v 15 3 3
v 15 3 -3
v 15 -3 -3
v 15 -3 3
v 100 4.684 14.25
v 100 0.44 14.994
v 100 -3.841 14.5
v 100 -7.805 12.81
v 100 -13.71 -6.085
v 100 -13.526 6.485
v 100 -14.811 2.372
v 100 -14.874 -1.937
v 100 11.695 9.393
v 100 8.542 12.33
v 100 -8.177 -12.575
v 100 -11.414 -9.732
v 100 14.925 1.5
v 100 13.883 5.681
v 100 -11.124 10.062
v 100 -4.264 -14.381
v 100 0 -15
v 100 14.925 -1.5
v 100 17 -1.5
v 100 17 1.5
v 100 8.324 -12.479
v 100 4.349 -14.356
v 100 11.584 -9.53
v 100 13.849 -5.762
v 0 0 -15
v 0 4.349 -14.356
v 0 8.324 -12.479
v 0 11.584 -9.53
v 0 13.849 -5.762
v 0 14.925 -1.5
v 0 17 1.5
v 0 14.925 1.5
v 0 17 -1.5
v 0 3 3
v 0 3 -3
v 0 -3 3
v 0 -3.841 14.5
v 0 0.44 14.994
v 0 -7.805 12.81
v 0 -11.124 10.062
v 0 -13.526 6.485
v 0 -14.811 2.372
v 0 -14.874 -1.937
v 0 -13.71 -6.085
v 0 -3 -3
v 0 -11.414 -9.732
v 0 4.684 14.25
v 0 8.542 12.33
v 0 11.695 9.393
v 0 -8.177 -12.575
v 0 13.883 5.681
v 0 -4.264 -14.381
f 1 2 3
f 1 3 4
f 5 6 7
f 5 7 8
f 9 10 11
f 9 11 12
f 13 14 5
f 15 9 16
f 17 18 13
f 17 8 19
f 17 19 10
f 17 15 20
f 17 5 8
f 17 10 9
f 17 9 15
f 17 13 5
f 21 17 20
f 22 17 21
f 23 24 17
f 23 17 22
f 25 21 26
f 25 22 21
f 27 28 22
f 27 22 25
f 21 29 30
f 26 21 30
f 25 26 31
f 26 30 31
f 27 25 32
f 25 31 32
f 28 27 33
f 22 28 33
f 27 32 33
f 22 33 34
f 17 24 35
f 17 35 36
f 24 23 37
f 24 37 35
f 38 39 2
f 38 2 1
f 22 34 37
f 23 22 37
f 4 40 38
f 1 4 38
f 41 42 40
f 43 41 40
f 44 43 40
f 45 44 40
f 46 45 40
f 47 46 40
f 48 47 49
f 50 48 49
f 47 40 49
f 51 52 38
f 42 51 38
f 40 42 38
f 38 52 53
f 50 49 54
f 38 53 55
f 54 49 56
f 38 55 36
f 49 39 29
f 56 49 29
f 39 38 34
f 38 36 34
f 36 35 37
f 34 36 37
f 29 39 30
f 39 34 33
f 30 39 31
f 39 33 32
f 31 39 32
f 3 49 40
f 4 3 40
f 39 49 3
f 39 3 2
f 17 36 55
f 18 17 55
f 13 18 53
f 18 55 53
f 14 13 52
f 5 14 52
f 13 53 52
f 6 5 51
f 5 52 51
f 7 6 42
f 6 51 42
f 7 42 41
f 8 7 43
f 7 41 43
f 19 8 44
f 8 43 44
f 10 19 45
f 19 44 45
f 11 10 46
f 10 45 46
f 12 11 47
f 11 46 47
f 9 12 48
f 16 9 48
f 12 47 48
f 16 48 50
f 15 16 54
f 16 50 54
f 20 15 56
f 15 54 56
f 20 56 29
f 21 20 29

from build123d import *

# Parameters (mm, degrees)
EXTRUDE_1_DEPTH     = 100
SKETCH_2_W          = 6
SKETCH_2_H          = 6
CUT_EXTRUDE_1_DEPTH = 15


with BuildPart() as part:
    # 草图1 → 凸台-拉伸1 (new body)
    with BuildSketch(Plane(origin=(0, 0, 0), x_dir=(0, 0, -1), z_dir=(1, 0, 0))):
        with BuildLine():
            Line((-1.5, 14.924811557), (-1.5, 0))
            Line((-1.5, 0), (1.5, 0))
            Line((1.5, 0), (1.5, 14.924811557))
            ThreePointArc((1.5, 14.924811557), (0, 15), (-1.5, 14.924811557))
        make_face()
        with BuildLine():
            Line((1.5, 0), (-1.5, 0))
            Line((-1.5, 0), (-1.5, 14.924811557))
            ThreePointArc((-1.5, 14.924811557), (-10.062305899, -11.124297731), (15, 0))
            ThreePointArc((15, 0), (11.124297731, 10.062305899), (1.5, 14.924811557))
            Line((1.5, 14.924811557), (1.5, 0))
        make_face()
        with BuildLine():
            Line((-1.5, 17), (-1.5, 14.924811557))
            ThreePointArc((-1.5, 14.924811557), (0, 15), (1.5, 14.924811557))
            Line((1.5, 14.924811557), (1.5, 17))
            Line((1.5, 17), (-1.5, 17))
        make_face()
    extrude(amount=EXTRUDE_1_DEPTH)

    # 草图2 → 切除-拉伸1 (cut)
    with BuildSketch(Plane.ZY):
        Rectangle(SKETCH_2_W, SKETCH_2_H)
    extrude(amount=-CUT_EXTRUDE_1_DEPTH, mode=Mode.SUBTRACT)


solid = part.part
